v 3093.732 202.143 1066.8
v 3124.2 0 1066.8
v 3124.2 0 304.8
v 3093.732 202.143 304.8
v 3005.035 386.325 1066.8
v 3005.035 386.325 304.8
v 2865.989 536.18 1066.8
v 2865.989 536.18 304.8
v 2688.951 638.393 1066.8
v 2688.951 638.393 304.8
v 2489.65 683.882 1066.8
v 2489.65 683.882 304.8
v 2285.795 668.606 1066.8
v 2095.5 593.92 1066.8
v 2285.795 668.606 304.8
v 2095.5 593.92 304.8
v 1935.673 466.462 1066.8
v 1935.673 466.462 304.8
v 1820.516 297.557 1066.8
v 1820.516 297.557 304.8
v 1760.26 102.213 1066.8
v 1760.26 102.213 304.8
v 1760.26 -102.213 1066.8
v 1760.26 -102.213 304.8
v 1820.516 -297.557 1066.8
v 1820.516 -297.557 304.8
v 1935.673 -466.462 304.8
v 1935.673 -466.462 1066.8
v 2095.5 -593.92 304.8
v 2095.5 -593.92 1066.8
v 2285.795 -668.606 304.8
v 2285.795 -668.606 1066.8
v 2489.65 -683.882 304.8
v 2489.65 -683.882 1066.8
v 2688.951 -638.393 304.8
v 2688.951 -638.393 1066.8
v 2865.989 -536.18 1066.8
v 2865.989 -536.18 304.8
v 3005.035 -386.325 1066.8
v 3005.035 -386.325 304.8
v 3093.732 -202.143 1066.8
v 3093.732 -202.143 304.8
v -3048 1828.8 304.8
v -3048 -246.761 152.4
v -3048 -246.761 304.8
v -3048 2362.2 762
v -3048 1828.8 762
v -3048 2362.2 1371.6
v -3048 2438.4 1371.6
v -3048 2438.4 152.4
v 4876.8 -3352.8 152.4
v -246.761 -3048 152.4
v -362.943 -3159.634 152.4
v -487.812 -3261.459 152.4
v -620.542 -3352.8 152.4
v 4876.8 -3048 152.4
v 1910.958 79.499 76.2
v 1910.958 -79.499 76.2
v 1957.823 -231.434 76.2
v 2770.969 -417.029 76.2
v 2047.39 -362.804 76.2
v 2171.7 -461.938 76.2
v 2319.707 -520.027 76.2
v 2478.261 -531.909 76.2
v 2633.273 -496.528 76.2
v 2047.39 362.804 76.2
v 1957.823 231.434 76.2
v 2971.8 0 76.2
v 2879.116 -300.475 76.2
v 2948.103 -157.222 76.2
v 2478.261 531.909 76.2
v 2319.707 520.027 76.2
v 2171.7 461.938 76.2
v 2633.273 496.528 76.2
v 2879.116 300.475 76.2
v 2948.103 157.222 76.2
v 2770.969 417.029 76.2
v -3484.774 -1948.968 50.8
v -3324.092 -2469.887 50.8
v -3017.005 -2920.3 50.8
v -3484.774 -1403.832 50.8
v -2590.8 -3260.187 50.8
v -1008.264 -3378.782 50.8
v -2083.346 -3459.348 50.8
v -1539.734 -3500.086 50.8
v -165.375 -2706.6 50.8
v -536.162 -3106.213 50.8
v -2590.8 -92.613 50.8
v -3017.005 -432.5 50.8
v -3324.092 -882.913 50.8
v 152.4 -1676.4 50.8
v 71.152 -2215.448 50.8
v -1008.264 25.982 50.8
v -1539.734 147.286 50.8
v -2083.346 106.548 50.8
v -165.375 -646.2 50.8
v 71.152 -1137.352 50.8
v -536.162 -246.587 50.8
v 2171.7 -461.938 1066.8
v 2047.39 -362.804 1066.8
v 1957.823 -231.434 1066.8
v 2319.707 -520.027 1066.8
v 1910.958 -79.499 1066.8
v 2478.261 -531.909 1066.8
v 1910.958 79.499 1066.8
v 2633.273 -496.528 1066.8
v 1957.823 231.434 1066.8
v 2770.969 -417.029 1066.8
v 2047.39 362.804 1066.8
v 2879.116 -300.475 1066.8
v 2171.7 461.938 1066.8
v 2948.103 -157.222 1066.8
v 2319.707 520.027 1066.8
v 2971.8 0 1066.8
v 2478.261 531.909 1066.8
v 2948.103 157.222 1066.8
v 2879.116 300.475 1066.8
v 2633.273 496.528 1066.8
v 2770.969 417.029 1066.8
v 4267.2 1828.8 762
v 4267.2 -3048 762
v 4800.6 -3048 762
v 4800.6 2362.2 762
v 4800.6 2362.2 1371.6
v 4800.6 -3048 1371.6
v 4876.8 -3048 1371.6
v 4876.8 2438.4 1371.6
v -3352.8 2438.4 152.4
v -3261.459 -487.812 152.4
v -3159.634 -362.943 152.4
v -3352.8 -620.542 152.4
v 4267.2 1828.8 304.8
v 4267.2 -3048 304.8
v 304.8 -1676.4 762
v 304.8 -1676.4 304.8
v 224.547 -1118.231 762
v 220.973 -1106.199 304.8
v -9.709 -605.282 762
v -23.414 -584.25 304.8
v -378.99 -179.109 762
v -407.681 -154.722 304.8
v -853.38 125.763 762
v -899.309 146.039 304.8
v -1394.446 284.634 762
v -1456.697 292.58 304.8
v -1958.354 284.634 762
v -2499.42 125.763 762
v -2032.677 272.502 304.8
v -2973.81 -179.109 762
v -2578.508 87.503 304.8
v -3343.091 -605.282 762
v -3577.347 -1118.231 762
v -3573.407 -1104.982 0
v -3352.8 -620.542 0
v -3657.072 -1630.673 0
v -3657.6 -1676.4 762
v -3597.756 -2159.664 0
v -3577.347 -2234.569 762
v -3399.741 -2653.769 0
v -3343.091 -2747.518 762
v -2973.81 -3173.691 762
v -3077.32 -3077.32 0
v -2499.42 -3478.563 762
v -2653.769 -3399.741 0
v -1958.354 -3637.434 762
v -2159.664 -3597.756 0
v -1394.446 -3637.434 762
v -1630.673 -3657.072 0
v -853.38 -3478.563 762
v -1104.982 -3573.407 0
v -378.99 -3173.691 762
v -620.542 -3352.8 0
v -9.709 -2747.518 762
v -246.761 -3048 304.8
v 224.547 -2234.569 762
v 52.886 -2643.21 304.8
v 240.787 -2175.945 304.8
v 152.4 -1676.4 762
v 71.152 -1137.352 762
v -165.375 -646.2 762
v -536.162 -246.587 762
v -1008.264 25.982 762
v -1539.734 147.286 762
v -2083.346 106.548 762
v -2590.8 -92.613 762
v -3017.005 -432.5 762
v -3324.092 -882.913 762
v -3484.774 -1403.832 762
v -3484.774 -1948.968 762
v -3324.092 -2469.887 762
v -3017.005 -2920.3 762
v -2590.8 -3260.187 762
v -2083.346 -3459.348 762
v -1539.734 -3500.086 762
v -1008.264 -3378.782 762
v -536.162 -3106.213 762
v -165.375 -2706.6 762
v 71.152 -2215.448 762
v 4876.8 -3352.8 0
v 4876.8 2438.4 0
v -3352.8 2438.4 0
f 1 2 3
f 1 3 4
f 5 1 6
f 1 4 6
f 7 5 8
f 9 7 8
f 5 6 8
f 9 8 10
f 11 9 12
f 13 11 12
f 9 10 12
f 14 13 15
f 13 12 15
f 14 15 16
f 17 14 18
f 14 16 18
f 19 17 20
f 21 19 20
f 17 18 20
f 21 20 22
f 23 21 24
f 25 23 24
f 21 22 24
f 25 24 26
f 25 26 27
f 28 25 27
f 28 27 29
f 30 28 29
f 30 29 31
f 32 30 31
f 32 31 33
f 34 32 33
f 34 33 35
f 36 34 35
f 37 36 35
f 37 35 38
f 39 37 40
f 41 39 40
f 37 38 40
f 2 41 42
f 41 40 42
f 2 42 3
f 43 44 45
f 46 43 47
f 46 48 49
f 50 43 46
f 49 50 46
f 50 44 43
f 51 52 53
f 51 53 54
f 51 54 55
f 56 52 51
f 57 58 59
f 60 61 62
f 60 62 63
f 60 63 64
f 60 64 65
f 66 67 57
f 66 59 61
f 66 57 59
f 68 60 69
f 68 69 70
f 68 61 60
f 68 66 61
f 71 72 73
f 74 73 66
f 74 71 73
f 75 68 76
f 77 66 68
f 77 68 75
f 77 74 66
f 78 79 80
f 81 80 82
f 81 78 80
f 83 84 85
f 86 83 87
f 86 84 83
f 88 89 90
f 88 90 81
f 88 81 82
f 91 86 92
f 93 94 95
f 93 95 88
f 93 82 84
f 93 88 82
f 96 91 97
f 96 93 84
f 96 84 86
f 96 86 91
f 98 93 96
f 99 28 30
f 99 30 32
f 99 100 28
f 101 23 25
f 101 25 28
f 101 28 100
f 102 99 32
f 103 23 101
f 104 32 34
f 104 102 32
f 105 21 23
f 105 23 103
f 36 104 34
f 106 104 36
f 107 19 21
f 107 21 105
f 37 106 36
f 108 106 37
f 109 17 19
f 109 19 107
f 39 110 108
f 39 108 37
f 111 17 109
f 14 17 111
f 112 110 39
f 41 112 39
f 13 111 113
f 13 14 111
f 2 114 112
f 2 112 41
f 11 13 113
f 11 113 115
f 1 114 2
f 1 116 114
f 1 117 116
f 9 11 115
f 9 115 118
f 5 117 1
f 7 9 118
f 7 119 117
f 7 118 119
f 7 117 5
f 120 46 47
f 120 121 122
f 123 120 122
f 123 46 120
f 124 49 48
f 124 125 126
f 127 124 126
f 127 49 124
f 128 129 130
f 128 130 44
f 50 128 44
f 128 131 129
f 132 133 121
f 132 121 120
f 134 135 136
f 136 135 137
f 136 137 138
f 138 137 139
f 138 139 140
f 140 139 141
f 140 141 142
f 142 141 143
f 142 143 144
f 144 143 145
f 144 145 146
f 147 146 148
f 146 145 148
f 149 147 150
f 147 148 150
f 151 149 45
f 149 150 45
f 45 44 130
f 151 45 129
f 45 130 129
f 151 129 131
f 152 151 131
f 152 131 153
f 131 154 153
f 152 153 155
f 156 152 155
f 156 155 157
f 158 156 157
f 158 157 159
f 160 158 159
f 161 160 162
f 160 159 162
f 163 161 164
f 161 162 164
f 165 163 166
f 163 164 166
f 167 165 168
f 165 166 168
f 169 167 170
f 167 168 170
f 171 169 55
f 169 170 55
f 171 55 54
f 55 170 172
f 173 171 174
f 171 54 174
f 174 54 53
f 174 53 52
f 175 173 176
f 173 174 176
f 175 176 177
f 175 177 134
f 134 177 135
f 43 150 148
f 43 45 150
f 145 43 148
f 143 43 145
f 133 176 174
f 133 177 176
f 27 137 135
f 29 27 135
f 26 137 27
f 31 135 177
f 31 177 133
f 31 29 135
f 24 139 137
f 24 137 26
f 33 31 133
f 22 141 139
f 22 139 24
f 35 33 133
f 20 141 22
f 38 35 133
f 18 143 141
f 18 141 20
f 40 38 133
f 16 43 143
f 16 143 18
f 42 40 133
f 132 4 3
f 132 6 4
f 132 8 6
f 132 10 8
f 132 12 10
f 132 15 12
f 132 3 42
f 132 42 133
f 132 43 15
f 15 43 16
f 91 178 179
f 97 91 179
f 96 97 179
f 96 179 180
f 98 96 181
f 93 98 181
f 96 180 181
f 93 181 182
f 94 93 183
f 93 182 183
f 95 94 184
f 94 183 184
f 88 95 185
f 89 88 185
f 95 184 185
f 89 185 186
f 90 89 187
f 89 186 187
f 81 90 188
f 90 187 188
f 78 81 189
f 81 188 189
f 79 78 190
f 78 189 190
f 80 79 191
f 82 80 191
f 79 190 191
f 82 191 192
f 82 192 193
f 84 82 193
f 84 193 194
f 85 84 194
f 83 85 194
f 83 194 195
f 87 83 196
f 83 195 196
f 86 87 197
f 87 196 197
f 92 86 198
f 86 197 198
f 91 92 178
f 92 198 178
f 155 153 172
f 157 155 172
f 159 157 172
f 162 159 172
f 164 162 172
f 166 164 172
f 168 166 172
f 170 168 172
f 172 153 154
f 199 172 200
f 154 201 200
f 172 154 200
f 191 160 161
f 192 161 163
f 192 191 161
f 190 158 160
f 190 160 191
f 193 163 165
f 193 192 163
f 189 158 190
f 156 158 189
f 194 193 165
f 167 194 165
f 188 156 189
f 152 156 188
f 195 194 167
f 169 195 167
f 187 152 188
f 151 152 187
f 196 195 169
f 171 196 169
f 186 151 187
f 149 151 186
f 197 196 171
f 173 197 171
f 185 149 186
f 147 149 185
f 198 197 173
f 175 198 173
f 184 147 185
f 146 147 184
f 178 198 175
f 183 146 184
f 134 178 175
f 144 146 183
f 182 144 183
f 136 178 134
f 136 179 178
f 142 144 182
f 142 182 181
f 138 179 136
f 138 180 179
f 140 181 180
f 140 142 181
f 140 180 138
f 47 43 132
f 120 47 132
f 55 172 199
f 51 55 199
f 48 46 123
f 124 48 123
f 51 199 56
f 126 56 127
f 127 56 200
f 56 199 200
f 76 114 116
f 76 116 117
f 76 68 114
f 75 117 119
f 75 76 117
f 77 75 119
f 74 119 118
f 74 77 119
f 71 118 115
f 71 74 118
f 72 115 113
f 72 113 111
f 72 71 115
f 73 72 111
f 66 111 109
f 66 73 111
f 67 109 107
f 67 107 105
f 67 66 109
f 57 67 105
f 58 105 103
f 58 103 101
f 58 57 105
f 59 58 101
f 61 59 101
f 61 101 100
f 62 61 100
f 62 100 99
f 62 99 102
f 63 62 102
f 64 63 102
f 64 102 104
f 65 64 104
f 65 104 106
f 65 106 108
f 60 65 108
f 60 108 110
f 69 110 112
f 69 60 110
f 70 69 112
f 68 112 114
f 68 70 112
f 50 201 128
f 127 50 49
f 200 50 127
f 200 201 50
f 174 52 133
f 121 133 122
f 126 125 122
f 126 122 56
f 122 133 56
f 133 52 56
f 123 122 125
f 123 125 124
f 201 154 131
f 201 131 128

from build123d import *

# Parameters (mm, degrees)
F1_DEPTH  = 304.8
F2_W      = 609.6
F2_H      = 609.6
F2_W_2    = 7315.2
F2_H_2    = 4876.8
F3_DEPTH  = 457.2
F4_W      = 7848.6
F4_H      = 76.2
F4_W_2    = 76.2
F4_H_2    = 5410.2
F5_DEPTH  = 609.6
F6_W      = 304.8
F6_H      = 3539.064786
F6_W_2    = 6231.79084
F6_H_2    = 304.8
F7_DEPTH  = 152.4
F8_R      = 1981.2
F9_DEPTH  = 1371.601
F10_R     = 1981.2
F11_DEPTH = 762
F12_R     = 1828.8
F13_DEPTH = 711.2
F14_R     = 685.8
F14_R_2   = 533.4
F15_DEPTH = 762
F16_R     = 533.4
F17_DEPTH = 228.6


with BuildPart() as f1:
    # F0 (on Top) → F1 (new body)
    with BuildSketch(Plane.XY):
        Polygon((4876.8, 2438.4), (-3048, 2438.4), (-3048, -304.8), (-304.8, -3048), (4876.8, -3048), align=None)
    extrude(amount=F1_DEPTH)

    # F2 (on face) → F3 (join)
    with BuildSketch(Plane.XY.offset(304.8)):
        with Locations((4572, 2133.6)):
            Rectangle(F2_W, F2_H)
        with Locations((609.6, 2133.6)):
            Rectangle(F2_W_2, F2_H)
        with Locations((4572, -609.6)):
            Rectangle(F2_W, F2_H_2)
    extrude(amount=F3_DEPTH)

    # F4 (on face) → F5 (join)
    with BuildSketch(Plane.XY.offset(762)):
        with Locations((876.3, 2400.3)):
            Rectangle(F4_W, F4_H)
        with Locations((4838.7, 2400.3)):
            Rectangle(F4_W_2, F4_H)
        with Locations((4838.7, -342.9)):
            Rectangle(F4_W_2, F4_H_2)
    extrude(amount=F5_DEPTH)

    # F6 (on Top) → F7 (join)
    with BuildSketch(Plane.XY):
        with Locations((-3200.4, 668.867607)):
            Rectangle(F6_W, F6_H)
        with Locations((1760.90458, -3200.4)):
            Rectangle(F6_W_2, F6_H_2)
    extrude(amount=F7_DEPTH)

    # F8 (on Top) → F9 (cut, through all)
    with BuildSketch(Plane.XY):
        with Locations((-1676.4, -1676.4)):
            Circle(F8_R)
    extrude(amount=F9_DEPTH, mode=Mode.SUBTRACT)

    # F10 (on Top) → F11 (join)
    with BuildSketch(Plane.XY):
        with Locations((-1676.4, -1676.4)):
            Circle(F10_R)
    extrude(amount=F11_DEPTH)

    # F12 (on face) → F13 (cut)
    with BuildSketch(Plane.XY.offset(762)):
        with Locations((-1676.4, -1676.4)):
            Circle(F12_R)
    extrude(amount=-F13_DEPTH, mode=Mode.SUBTRACT)

    # F14 (on face) → F15 (join)
    with BuildSketch(Plane.XY.offset(304.8)):
        with Locations((2438.4, 0)):
            Circle(F14_R)
        with Locations((2438.4, 0)):
            Circle(F14_R_2, mode=Mode.SUBTRACT)
    extrude(amount=F15_DEPTH)

    # F16 (on face) → F17 (cut)
    with BuildSketch(Plane.XY.offset(304.8)):
        with Locations((2438.4, 0)):
            Circle(F16_R)
    extrude(amount=-F17_DEPTH, mode=Mode.SUBTRACT)


solid = f1.part
